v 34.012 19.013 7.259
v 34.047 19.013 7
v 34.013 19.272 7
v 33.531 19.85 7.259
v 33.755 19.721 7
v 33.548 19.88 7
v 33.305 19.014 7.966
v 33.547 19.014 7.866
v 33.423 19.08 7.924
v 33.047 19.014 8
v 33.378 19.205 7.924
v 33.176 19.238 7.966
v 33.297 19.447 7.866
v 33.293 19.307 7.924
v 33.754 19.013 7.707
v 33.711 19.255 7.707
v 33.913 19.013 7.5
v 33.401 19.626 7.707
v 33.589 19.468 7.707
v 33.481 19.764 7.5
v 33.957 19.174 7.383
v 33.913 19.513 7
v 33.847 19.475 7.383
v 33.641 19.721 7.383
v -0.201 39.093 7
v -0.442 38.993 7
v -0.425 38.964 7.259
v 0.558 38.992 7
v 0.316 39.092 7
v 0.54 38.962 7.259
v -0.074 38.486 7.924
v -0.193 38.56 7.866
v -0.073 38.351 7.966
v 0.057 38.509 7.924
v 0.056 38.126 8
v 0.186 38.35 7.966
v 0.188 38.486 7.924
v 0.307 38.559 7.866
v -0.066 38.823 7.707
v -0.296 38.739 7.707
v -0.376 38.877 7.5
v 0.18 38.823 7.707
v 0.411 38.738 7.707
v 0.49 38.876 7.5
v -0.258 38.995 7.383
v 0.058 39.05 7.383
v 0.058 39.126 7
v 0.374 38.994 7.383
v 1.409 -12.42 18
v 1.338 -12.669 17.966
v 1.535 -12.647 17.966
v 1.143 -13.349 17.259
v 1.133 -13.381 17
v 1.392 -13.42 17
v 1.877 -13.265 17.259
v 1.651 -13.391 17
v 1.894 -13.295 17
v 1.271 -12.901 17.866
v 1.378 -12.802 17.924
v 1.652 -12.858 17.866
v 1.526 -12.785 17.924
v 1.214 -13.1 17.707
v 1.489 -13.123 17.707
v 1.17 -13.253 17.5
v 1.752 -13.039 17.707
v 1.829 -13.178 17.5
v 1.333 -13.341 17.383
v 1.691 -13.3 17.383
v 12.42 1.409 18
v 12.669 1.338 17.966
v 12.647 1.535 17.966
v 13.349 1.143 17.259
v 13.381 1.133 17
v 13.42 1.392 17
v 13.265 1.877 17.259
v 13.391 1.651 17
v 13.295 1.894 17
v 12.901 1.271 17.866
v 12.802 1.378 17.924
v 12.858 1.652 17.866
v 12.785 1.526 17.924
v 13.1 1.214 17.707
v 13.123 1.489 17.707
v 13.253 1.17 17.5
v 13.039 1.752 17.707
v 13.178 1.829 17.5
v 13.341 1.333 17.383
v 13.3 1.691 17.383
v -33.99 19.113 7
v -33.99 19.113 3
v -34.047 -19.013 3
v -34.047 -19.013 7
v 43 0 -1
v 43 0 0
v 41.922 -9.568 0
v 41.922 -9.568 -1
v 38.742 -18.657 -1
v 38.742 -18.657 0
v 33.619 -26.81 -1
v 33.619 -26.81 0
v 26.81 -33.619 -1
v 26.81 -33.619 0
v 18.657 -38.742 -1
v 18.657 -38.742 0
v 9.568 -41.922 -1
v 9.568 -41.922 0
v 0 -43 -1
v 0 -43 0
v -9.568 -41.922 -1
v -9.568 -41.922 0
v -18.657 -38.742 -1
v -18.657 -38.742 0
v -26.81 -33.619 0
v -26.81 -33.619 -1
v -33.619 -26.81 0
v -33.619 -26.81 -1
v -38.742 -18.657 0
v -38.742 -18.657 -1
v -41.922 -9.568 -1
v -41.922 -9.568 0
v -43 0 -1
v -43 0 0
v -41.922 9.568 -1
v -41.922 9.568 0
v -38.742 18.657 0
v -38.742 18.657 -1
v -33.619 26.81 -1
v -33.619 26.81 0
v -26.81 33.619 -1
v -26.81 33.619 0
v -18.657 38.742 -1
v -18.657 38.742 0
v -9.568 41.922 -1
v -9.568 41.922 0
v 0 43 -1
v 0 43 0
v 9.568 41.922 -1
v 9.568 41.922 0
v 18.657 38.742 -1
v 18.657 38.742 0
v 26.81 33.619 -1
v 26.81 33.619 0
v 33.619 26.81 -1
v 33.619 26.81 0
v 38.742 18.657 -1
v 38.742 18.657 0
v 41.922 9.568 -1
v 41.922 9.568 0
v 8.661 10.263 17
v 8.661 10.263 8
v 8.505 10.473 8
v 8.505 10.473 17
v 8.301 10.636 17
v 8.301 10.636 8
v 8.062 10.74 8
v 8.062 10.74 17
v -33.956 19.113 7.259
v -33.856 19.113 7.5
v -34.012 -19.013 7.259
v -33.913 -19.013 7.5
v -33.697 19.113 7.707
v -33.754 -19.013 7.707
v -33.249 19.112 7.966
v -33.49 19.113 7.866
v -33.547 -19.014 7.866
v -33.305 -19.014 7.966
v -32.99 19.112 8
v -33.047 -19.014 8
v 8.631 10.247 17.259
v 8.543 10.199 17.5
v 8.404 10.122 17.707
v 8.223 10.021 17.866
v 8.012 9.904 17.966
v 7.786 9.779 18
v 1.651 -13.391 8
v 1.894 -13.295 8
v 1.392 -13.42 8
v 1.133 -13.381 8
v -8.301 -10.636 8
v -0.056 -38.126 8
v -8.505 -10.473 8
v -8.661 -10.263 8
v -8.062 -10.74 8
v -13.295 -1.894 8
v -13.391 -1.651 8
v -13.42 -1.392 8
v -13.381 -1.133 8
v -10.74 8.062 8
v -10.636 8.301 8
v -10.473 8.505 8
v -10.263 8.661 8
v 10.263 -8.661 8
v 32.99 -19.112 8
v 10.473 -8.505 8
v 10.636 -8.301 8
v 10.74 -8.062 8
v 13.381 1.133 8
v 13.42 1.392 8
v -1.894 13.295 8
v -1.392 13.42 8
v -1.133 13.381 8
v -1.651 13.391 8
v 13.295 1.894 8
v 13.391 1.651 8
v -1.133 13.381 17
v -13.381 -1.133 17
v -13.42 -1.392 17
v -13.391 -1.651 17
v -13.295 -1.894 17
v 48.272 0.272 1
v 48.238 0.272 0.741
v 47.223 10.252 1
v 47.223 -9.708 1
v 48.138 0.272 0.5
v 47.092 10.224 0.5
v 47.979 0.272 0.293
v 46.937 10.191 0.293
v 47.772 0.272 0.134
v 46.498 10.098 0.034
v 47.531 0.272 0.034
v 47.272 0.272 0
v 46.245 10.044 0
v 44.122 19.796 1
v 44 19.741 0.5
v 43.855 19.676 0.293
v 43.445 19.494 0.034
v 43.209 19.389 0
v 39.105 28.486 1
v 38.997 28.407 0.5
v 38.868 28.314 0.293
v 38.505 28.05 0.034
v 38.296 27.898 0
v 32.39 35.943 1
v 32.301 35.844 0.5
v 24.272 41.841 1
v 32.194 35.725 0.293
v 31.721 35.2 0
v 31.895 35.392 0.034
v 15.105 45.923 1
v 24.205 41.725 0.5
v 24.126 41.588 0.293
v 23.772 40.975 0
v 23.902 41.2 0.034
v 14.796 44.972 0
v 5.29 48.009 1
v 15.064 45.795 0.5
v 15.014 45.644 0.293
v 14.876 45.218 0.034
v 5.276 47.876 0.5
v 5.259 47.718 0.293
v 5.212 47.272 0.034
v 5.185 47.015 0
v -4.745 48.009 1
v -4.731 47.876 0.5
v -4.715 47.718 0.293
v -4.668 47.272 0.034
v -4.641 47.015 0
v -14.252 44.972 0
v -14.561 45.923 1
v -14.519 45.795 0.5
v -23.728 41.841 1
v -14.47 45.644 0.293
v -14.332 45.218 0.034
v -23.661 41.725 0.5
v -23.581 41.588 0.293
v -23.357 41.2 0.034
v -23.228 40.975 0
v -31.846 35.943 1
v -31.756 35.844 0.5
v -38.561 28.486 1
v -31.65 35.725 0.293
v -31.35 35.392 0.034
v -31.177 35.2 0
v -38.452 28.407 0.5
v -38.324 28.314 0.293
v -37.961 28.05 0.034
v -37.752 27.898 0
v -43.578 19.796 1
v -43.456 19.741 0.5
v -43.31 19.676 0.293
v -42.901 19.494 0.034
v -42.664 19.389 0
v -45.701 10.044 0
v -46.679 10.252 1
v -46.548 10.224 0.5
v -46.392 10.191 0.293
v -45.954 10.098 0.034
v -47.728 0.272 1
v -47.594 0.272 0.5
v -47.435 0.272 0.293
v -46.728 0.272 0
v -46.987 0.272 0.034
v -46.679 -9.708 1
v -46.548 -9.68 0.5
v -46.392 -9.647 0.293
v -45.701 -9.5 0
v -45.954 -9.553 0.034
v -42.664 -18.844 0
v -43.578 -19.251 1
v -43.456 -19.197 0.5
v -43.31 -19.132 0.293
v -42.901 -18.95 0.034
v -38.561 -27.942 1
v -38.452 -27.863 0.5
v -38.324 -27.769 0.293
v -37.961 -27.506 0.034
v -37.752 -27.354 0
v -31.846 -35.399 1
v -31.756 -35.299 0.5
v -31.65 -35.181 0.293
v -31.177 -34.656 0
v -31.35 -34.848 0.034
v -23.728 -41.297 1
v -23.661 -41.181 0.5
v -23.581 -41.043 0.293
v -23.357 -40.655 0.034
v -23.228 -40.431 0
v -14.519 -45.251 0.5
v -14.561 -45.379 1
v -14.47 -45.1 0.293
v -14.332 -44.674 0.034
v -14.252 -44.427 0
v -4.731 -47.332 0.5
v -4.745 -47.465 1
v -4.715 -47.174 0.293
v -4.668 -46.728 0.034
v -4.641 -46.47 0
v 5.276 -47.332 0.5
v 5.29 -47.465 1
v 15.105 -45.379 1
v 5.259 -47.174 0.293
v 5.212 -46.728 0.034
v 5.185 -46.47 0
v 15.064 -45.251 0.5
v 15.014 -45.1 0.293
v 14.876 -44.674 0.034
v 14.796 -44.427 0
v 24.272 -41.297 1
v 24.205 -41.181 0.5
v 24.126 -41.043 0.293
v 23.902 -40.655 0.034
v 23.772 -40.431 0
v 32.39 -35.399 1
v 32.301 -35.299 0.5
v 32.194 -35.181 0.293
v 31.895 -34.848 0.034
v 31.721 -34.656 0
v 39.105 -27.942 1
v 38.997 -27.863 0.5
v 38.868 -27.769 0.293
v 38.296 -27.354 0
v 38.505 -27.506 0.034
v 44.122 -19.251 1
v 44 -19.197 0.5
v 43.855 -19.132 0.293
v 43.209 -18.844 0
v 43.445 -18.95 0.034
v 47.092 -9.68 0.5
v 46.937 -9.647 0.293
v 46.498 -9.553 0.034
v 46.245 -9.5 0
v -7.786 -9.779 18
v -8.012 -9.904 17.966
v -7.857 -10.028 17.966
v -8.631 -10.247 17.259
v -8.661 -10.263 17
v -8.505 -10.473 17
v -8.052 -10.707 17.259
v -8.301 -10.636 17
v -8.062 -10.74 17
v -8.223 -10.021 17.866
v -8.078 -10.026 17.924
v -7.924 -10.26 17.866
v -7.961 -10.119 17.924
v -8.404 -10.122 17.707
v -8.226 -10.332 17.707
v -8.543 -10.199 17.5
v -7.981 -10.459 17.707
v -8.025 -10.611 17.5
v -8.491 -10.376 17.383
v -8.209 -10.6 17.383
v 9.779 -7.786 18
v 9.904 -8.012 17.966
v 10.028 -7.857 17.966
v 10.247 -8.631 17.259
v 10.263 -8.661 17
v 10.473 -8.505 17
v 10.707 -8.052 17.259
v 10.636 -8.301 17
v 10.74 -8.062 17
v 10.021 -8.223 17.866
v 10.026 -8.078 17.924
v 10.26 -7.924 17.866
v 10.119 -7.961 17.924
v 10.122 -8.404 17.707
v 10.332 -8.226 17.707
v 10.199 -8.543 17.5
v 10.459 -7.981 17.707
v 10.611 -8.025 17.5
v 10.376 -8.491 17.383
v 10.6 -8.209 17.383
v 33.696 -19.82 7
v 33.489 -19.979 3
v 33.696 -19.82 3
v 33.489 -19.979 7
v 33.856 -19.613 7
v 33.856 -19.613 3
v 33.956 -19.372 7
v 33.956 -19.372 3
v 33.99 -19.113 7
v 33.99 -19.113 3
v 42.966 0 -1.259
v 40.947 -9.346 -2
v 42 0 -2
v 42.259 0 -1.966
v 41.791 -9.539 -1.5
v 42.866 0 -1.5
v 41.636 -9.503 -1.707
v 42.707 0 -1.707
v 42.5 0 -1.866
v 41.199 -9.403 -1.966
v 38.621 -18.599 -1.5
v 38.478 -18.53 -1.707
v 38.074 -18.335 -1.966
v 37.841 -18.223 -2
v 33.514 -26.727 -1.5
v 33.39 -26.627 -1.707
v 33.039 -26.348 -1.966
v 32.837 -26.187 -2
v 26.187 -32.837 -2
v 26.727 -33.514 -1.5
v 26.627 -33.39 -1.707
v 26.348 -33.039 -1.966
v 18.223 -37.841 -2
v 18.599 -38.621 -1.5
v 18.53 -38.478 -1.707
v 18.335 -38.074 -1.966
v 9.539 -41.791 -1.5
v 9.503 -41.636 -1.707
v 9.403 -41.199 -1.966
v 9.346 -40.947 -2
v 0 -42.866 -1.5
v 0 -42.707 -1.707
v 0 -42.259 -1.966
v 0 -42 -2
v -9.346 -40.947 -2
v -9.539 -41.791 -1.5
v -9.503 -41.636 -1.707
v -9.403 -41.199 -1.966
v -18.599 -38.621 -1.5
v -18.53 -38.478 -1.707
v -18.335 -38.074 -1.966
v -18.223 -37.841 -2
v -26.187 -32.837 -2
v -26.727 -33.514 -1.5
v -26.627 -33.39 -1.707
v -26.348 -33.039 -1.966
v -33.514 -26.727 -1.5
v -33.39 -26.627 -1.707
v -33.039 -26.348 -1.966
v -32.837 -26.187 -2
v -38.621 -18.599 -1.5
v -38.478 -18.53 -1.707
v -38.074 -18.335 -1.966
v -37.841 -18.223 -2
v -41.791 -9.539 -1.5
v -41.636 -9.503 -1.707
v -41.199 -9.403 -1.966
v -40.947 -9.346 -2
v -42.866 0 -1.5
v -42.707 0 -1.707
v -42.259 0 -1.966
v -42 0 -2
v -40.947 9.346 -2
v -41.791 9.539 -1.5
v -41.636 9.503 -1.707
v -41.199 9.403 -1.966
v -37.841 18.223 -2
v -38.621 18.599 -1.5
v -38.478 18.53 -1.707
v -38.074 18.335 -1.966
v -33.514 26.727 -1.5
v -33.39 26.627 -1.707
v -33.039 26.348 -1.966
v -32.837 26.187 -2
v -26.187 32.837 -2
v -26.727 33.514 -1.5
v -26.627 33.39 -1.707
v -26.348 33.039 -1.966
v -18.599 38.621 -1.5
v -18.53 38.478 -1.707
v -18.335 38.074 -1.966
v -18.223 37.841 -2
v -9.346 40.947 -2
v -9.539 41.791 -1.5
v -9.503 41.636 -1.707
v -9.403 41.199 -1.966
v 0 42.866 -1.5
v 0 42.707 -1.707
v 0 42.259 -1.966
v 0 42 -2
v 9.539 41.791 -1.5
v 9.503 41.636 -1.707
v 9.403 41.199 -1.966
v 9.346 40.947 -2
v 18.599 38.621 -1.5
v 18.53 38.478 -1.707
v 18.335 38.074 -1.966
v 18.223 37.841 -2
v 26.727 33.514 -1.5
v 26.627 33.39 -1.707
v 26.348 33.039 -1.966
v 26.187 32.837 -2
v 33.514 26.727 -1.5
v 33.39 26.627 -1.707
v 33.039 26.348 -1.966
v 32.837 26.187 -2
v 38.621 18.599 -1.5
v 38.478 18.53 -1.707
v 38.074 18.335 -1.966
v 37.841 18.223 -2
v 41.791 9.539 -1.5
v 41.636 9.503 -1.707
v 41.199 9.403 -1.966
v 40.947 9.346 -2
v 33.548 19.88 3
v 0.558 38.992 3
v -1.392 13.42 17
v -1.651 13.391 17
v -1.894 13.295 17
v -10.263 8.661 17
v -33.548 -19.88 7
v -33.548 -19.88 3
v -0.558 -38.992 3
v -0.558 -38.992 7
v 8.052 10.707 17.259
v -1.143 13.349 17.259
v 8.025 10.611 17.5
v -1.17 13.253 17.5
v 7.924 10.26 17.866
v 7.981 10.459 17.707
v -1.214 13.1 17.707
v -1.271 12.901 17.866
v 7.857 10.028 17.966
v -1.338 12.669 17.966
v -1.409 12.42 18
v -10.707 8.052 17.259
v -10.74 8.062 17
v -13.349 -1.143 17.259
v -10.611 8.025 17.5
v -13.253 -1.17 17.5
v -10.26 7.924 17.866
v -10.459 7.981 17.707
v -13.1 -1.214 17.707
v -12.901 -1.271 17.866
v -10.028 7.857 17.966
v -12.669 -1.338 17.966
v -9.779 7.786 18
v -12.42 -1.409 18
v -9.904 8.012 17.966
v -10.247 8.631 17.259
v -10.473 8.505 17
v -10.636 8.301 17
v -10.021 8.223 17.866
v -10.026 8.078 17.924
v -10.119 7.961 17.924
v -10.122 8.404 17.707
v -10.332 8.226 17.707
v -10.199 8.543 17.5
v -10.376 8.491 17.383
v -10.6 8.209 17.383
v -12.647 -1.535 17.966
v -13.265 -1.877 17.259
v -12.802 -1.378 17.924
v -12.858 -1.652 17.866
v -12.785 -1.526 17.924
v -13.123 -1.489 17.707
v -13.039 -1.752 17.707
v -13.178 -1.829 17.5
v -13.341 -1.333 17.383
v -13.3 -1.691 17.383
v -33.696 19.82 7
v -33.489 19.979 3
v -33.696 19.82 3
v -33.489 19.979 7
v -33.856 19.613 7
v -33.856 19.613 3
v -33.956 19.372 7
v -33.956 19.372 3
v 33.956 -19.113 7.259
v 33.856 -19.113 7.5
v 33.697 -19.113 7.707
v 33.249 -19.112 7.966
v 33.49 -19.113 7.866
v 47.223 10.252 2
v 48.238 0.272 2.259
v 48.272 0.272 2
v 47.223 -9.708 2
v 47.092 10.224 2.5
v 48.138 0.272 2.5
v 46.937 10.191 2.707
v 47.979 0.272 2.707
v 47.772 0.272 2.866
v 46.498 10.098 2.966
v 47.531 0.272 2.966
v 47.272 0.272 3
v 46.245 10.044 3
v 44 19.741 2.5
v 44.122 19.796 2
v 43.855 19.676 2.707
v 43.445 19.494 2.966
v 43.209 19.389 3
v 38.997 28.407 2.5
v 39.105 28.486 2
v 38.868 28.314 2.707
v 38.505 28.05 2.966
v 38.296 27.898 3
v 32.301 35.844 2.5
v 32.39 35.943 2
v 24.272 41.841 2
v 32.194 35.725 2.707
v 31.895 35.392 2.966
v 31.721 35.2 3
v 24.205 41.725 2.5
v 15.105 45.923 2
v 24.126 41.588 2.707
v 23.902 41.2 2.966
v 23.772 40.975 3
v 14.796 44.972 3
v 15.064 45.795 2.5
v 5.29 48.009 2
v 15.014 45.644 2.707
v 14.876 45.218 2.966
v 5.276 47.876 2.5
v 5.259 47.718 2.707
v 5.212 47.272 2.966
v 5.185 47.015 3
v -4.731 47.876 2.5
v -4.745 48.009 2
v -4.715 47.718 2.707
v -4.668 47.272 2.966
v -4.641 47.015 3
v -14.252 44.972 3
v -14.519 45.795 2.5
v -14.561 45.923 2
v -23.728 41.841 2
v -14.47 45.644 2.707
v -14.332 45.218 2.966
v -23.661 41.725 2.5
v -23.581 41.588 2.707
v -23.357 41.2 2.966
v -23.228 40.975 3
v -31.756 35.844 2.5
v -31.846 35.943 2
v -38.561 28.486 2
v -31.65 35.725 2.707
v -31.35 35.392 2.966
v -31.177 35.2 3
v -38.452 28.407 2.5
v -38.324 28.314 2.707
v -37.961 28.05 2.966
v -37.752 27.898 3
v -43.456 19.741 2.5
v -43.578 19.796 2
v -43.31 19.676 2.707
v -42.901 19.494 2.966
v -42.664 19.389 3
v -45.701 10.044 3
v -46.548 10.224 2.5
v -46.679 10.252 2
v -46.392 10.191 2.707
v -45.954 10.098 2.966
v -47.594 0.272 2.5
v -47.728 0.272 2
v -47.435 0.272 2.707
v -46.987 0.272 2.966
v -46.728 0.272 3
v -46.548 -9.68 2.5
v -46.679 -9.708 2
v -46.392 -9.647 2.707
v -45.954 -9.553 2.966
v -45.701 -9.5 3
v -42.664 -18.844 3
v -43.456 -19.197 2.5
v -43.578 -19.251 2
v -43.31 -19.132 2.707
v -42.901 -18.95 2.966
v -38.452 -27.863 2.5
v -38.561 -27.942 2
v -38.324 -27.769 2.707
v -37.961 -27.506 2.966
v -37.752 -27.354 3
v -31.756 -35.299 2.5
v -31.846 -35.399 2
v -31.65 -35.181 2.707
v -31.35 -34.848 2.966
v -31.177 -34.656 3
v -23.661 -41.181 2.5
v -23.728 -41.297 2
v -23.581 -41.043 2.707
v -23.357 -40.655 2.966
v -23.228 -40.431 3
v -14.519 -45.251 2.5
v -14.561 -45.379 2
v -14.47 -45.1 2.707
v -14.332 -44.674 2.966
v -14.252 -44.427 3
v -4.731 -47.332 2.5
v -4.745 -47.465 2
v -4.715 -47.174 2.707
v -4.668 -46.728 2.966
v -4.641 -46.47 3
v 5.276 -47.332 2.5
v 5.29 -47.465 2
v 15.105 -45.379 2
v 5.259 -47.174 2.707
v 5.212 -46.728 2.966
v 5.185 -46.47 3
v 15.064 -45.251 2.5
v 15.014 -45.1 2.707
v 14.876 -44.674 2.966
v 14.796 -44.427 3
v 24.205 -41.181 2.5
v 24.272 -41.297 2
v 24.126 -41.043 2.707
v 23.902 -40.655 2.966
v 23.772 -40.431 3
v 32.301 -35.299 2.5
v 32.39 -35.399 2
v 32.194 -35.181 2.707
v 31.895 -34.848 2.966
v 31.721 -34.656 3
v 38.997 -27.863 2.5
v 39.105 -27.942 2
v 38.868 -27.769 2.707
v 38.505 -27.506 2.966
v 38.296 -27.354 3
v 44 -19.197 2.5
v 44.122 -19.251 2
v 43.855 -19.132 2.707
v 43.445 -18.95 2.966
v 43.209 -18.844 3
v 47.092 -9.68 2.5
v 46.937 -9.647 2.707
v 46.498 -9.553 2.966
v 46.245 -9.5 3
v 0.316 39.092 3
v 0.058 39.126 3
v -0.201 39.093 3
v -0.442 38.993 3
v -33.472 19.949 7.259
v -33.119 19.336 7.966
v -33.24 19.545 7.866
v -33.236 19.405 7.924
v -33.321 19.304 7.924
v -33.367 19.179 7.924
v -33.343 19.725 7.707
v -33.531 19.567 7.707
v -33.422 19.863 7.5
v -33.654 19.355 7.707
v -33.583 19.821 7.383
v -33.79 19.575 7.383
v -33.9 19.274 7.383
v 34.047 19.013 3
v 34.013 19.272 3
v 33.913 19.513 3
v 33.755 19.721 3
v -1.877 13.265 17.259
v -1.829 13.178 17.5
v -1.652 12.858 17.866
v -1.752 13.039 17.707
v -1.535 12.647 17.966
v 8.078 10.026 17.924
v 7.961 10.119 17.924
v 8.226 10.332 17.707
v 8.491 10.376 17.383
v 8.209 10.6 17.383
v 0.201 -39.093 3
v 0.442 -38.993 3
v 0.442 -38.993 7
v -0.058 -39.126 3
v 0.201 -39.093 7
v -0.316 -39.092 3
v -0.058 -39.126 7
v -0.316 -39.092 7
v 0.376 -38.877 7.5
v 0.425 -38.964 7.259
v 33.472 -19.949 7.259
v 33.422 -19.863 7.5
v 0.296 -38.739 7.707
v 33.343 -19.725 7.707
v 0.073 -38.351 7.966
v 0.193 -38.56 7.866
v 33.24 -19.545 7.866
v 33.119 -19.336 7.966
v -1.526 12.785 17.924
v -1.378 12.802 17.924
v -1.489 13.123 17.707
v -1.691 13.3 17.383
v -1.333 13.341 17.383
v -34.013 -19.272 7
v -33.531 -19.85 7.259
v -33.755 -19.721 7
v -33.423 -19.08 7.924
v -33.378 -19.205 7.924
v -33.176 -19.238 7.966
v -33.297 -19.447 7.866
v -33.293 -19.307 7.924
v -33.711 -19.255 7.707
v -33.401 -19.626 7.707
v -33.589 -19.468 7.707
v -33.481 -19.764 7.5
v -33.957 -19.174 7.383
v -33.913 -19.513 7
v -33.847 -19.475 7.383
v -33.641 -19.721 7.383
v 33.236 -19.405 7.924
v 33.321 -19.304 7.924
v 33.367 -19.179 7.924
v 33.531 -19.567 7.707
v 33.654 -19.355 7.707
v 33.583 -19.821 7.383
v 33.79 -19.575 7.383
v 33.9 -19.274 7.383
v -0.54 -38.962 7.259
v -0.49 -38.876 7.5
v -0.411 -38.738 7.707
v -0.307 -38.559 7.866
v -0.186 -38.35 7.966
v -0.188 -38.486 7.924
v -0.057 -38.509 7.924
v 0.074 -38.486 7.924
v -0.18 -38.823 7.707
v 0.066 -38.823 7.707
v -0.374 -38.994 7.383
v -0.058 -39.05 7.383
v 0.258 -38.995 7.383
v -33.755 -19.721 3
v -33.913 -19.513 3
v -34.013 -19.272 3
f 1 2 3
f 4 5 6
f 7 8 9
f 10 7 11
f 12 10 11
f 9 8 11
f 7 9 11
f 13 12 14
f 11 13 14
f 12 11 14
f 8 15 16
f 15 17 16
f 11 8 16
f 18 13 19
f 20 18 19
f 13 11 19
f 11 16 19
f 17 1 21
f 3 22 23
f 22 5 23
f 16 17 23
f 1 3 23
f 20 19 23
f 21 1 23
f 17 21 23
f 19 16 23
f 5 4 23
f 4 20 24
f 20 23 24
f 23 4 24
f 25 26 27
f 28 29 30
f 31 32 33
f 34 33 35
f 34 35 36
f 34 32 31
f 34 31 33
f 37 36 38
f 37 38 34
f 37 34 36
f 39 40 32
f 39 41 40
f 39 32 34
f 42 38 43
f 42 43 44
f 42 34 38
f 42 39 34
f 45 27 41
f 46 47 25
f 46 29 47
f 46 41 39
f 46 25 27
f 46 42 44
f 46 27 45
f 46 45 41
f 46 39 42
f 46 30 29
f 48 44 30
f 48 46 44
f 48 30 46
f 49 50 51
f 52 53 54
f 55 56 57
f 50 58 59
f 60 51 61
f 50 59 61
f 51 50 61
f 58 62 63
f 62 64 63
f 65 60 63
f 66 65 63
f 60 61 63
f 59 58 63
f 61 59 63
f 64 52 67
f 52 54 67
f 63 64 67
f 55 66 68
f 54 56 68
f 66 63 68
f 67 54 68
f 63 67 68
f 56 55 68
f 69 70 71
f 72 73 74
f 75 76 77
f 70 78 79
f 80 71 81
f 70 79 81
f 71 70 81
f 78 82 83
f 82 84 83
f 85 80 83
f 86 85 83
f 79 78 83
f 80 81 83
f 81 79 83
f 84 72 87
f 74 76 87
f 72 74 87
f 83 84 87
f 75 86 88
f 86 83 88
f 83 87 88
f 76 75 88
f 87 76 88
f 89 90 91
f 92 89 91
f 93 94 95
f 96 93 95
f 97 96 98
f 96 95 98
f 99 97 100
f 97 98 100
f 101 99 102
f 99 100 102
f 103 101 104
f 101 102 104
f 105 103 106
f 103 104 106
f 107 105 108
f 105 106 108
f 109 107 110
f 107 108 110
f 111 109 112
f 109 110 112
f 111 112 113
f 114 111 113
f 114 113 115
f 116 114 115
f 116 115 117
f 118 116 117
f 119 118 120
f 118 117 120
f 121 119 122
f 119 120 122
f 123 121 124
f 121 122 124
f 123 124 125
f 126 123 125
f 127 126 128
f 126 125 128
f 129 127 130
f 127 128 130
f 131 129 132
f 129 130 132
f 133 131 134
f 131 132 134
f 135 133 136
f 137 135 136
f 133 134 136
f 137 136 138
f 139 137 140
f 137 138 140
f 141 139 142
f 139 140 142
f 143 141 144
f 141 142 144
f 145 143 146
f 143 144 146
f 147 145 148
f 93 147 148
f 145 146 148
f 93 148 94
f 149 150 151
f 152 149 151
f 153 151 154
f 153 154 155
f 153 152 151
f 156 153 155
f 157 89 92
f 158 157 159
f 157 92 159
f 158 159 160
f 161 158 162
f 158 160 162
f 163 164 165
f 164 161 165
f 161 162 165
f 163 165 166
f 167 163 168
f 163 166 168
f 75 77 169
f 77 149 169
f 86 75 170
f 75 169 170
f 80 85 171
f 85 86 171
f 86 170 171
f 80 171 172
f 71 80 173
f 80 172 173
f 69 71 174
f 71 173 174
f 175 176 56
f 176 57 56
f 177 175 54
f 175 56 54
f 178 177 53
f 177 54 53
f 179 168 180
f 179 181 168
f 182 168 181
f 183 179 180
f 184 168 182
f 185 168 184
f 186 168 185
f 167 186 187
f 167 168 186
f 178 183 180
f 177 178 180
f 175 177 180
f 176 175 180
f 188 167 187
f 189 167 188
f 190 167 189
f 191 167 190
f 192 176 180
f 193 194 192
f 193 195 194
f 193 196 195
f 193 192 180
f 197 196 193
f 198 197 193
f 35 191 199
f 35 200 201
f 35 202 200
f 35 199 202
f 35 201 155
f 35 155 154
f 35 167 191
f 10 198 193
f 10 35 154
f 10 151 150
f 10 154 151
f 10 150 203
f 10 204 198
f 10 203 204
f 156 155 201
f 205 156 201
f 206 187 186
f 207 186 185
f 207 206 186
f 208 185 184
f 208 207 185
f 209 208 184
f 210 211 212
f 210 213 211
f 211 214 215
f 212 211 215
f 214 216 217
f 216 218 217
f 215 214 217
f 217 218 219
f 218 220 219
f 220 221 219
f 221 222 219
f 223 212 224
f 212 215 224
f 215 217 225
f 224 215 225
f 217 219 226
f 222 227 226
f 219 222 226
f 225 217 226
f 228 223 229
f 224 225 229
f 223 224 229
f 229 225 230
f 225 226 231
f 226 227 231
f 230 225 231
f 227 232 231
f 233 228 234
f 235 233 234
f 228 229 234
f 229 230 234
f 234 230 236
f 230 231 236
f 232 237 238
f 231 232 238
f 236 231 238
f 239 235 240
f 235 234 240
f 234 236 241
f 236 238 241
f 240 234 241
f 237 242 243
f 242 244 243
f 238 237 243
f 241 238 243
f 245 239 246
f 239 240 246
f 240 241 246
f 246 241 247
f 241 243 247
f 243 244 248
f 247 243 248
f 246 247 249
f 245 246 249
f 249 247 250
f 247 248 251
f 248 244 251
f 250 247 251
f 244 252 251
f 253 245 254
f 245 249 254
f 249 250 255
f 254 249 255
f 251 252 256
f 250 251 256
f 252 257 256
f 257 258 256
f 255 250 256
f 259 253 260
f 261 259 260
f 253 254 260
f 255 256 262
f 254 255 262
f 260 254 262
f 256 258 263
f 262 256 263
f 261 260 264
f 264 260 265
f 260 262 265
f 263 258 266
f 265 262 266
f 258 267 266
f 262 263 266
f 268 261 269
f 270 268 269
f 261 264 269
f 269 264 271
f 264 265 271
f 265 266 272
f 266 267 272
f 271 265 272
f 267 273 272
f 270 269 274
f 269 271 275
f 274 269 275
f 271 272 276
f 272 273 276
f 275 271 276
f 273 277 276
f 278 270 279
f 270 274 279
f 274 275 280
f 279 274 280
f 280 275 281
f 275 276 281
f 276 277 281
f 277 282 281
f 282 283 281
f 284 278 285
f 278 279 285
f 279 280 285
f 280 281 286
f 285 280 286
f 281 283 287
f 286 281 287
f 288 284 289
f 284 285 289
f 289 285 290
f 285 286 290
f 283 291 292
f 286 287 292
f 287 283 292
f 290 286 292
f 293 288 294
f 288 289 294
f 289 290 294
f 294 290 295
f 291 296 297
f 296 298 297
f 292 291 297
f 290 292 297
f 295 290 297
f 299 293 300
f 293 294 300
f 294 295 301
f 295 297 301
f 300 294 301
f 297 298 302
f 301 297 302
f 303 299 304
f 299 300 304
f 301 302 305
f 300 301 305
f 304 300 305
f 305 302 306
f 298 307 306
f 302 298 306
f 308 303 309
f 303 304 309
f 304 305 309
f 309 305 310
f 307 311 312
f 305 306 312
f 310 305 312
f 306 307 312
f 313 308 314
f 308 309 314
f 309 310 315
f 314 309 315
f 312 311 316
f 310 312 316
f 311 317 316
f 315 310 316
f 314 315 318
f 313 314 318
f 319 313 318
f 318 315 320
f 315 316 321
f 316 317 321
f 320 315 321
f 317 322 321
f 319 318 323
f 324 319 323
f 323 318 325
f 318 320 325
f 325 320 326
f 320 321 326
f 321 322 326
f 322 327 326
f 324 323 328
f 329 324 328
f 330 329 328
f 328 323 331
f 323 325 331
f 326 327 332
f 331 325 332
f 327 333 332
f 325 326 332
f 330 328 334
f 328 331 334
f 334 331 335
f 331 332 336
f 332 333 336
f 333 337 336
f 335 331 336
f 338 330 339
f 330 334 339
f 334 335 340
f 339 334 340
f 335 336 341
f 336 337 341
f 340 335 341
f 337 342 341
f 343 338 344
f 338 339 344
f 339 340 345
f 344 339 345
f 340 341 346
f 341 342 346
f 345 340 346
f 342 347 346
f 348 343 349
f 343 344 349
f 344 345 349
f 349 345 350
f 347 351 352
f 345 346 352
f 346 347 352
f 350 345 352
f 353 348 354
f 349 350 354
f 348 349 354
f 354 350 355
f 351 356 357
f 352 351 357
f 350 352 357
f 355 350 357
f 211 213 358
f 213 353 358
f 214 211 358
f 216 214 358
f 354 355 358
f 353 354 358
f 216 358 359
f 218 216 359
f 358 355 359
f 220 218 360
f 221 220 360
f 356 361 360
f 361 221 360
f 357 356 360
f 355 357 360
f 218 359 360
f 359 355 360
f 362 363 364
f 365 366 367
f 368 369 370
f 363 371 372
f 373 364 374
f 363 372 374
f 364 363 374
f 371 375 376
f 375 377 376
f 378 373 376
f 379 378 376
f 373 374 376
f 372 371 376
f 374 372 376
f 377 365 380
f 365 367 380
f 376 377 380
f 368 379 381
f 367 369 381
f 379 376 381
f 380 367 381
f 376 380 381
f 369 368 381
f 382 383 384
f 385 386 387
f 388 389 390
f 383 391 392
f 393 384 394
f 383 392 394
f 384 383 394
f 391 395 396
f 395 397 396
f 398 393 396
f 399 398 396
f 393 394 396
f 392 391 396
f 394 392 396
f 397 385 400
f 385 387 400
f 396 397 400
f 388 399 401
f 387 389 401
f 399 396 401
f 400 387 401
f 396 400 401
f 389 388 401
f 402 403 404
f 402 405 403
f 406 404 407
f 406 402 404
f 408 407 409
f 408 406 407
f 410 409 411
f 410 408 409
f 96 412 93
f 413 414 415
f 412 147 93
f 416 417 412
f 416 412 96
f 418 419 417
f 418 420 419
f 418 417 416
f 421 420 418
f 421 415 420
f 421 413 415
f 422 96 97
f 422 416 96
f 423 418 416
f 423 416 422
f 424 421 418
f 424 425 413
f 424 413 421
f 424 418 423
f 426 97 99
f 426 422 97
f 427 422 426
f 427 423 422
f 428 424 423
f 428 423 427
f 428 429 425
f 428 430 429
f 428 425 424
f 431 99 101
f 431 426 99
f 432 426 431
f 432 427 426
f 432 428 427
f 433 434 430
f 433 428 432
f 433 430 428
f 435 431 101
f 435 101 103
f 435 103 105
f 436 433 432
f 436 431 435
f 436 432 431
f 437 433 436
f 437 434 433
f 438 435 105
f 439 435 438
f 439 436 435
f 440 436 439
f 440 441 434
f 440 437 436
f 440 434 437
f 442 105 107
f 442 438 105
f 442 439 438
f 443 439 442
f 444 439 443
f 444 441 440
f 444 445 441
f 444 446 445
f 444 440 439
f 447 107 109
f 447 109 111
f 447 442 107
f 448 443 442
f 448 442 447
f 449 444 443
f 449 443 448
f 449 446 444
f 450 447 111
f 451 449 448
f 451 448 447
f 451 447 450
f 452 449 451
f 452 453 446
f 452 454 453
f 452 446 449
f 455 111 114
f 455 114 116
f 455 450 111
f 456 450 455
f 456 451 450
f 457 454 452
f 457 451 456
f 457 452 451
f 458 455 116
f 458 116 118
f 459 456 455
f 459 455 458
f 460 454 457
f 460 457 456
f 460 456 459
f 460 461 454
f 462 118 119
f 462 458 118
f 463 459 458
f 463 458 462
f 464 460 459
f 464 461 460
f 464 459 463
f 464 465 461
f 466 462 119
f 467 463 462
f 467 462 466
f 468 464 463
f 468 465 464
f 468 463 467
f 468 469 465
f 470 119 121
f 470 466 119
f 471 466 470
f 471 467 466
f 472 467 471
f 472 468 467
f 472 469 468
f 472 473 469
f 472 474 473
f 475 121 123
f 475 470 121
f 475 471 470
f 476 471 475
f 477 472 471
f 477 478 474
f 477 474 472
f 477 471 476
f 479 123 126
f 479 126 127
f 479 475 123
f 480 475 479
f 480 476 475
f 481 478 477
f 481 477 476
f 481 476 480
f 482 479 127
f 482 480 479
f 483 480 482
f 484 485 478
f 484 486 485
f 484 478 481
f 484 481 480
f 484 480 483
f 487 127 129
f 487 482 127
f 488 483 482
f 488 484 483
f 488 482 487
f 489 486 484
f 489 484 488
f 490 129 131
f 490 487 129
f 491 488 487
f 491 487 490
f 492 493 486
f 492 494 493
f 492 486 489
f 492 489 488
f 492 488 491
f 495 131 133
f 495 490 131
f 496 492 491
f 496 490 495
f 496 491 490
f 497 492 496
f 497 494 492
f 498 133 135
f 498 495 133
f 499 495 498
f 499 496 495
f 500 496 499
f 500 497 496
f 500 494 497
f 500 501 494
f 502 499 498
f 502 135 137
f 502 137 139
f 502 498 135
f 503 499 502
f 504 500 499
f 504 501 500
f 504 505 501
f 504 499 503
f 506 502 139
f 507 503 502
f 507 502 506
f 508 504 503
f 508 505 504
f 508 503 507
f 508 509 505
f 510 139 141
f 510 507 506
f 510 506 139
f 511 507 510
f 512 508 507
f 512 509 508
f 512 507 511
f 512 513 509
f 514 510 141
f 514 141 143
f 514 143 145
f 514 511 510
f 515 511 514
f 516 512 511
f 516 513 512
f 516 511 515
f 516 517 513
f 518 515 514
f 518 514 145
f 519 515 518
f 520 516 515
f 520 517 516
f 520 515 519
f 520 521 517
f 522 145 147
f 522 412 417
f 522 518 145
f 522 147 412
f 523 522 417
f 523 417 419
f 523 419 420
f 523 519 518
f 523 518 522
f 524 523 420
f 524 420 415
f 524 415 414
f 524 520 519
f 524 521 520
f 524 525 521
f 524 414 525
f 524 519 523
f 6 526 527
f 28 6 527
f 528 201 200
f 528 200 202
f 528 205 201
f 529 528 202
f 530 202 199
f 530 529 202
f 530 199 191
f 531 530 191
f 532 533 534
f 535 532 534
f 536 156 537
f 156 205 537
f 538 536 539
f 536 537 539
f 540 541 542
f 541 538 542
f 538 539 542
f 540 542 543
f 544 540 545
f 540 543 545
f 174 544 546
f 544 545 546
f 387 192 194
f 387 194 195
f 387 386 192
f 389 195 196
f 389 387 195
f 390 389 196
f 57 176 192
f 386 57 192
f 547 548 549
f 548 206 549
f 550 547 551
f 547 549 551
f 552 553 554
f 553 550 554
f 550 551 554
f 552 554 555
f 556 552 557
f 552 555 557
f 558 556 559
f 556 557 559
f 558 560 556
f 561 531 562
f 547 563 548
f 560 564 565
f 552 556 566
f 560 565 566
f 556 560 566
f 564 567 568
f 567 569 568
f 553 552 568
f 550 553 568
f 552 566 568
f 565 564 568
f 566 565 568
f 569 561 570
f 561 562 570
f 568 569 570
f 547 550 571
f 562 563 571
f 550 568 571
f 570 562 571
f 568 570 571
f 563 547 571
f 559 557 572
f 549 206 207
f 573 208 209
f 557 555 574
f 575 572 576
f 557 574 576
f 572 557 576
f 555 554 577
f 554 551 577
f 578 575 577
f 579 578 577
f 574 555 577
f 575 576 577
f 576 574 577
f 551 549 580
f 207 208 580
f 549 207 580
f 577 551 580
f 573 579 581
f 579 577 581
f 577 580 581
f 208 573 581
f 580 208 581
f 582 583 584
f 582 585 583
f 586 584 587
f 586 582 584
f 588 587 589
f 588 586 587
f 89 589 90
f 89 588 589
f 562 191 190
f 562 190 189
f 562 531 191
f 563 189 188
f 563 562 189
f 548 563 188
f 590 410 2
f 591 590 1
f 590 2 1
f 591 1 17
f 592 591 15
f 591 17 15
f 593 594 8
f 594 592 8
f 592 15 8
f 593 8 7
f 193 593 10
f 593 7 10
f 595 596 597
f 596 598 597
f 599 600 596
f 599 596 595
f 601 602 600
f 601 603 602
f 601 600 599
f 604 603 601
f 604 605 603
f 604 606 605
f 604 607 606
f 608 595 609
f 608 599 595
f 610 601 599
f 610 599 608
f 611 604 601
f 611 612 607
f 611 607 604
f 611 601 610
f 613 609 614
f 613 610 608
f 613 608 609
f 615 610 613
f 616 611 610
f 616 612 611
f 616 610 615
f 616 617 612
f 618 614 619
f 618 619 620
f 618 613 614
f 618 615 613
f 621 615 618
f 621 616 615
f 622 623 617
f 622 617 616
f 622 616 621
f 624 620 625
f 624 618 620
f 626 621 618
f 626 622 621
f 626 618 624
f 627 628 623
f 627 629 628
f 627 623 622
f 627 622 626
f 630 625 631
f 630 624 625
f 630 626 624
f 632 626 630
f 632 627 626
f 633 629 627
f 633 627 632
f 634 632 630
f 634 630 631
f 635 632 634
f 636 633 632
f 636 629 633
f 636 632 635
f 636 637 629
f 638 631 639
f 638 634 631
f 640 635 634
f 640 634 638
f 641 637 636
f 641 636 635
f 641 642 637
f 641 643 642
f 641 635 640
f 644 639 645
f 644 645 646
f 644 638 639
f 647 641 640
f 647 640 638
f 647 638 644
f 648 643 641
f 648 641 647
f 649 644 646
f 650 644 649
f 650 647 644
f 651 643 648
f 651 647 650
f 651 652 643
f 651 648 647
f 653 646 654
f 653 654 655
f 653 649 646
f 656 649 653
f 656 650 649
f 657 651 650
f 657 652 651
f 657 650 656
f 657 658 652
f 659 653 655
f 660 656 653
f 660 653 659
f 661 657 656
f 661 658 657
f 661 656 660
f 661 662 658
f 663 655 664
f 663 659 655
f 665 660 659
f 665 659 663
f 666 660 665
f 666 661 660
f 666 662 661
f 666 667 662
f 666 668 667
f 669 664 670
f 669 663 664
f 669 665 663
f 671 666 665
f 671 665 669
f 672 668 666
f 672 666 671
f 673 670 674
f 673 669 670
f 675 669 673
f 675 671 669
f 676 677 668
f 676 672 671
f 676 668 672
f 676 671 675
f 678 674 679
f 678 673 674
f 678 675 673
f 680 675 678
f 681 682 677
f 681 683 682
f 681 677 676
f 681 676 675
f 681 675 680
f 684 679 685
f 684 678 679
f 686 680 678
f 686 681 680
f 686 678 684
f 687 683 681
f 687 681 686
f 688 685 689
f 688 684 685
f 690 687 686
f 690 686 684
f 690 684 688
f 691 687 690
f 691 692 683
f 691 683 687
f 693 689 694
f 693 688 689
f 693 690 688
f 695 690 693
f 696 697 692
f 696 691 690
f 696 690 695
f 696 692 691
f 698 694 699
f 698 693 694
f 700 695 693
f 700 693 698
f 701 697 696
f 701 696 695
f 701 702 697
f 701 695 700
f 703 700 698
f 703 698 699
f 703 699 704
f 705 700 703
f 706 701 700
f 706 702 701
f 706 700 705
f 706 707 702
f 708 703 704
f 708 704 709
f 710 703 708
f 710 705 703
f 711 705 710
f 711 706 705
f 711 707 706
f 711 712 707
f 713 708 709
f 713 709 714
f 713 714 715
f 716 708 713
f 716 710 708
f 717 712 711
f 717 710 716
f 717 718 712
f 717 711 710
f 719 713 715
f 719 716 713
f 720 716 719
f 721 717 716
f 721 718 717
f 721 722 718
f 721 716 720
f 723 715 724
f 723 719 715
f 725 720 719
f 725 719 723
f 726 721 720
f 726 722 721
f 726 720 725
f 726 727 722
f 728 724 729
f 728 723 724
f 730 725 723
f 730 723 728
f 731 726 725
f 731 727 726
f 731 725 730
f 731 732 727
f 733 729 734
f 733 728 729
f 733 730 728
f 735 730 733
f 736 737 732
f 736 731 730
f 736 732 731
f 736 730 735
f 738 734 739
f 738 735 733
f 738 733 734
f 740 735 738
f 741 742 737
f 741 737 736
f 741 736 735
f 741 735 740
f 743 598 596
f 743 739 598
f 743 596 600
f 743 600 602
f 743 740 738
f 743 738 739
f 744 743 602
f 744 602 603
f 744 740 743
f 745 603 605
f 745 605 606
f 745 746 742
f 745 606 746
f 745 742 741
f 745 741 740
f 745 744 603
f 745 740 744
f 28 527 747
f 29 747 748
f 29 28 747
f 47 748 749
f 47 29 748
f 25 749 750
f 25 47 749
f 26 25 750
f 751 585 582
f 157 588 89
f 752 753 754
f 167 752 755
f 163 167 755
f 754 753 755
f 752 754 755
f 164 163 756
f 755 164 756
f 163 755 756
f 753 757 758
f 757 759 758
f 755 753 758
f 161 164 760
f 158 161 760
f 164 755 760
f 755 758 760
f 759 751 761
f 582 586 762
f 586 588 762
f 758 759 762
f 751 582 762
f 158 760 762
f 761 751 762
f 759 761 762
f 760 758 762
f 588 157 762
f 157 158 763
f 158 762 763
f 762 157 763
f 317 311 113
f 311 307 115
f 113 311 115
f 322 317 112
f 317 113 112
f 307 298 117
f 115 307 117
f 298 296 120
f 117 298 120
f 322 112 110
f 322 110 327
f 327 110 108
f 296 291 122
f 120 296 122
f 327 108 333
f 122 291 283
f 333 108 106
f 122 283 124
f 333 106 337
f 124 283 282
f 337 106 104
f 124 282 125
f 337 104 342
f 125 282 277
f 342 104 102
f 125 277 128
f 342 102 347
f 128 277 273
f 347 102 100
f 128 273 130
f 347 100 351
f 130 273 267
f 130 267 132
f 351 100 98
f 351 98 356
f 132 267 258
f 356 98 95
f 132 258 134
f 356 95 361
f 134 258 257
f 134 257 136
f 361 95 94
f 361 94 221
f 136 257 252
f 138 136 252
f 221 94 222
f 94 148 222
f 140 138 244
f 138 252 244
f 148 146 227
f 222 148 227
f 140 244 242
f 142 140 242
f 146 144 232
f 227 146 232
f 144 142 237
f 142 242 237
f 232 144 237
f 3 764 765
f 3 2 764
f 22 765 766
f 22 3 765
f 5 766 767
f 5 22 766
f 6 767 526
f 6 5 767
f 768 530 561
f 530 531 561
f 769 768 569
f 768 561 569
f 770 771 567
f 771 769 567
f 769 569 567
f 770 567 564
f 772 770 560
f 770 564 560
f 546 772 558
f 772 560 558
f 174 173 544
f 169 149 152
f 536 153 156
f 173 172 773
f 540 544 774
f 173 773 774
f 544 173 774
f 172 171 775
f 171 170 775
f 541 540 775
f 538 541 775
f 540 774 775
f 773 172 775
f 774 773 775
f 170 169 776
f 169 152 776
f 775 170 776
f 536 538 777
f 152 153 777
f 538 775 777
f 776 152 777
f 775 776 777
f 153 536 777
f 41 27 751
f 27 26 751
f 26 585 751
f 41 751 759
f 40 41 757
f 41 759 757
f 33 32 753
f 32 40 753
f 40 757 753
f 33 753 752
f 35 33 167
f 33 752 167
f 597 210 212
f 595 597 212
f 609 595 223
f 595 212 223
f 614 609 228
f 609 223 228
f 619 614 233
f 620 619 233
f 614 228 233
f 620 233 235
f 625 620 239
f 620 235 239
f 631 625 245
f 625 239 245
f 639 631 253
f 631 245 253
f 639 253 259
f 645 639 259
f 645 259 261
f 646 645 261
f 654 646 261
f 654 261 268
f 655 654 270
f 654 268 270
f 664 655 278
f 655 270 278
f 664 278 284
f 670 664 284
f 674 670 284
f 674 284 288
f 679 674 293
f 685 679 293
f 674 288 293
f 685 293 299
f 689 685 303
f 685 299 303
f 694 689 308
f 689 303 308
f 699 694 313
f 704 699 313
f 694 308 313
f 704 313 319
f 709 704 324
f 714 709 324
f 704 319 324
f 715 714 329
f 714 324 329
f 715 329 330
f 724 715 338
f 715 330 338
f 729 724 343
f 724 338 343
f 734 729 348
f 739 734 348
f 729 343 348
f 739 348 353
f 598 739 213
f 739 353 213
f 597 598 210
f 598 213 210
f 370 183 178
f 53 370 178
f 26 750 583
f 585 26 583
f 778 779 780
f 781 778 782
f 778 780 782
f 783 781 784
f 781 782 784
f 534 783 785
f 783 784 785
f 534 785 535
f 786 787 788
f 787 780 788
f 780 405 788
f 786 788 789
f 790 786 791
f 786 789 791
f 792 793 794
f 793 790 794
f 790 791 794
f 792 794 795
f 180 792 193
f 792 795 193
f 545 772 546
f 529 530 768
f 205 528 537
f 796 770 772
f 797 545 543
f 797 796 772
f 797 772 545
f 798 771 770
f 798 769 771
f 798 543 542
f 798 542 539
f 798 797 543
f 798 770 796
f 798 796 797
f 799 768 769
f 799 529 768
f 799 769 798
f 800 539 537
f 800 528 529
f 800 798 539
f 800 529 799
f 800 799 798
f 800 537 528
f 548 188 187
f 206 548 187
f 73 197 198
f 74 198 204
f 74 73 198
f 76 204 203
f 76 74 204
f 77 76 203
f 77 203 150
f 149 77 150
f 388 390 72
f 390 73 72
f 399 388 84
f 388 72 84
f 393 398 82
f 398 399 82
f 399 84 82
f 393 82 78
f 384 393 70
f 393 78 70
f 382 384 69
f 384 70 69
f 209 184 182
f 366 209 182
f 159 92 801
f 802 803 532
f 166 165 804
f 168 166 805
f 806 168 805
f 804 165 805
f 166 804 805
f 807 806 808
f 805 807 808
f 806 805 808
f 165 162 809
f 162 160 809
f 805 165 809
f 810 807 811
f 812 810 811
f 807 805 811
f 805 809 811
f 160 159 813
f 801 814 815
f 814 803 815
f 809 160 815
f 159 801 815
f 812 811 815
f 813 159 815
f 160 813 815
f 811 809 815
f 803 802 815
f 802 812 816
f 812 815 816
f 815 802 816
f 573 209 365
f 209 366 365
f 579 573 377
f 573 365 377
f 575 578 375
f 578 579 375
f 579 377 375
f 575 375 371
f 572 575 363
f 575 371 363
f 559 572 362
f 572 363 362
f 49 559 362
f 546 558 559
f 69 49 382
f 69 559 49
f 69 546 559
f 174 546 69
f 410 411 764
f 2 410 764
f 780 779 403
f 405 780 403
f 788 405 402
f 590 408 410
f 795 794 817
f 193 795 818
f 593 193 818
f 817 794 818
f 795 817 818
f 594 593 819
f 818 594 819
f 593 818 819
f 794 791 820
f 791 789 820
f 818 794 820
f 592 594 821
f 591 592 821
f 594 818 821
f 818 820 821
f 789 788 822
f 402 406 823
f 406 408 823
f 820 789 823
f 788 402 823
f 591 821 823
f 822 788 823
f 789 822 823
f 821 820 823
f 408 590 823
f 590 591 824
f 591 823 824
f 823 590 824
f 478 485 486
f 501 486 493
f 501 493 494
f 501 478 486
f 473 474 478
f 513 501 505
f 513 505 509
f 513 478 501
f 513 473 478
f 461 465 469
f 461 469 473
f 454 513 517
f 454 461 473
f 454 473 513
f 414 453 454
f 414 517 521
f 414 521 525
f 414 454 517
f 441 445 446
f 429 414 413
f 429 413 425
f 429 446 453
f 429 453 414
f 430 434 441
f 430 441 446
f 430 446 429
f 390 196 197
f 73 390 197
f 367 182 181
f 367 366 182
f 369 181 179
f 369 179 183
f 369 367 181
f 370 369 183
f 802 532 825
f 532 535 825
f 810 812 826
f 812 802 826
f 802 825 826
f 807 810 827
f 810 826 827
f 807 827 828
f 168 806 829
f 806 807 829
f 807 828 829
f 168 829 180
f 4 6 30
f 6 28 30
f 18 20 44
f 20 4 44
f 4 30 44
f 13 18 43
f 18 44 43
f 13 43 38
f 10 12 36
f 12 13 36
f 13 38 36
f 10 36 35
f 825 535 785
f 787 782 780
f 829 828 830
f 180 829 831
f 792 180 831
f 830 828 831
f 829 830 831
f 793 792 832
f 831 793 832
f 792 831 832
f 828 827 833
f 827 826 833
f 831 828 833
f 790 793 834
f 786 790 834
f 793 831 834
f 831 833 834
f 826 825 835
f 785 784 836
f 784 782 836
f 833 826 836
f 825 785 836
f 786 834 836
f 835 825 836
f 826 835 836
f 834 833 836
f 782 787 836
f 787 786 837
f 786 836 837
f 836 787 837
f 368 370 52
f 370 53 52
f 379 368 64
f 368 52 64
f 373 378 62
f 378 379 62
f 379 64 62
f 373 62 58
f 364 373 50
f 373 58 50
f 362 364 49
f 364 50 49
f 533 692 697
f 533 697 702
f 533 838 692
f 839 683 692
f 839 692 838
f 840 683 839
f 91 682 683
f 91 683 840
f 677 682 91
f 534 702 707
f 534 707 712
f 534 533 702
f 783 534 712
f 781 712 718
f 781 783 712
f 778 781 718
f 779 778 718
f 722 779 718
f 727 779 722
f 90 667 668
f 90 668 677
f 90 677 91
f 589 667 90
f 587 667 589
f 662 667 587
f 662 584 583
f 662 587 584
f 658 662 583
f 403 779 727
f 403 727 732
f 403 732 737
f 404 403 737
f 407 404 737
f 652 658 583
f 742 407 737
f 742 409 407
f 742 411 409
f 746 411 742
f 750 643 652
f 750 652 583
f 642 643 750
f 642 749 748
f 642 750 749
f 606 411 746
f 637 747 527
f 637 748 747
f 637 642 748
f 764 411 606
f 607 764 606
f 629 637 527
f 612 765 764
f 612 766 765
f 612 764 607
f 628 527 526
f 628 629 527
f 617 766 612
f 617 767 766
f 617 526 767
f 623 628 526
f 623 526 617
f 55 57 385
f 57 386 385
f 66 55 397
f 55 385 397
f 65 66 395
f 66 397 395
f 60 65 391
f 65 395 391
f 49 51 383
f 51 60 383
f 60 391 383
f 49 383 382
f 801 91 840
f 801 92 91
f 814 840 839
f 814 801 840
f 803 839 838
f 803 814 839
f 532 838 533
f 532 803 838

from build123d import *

# Parameters (mm, degrees)
F0_R     = 48
F1_DEPTH = 3
F3_DEPTH = 5
F5_DEPTH = 10
F6_R     = 43
F7_DEPTH = 2
F8_R     = 1


with BuildPart() as f1:
    # F0 (on Top) → F1 (new body)
    with BuildSketch(Plane.XY):
        with Locations((0.272178, 0.272177)):
            Circle(F0_R)
    extrude(amount=F1_DEPTH)

    # F2 (on face) → F3 (join)
    with BuildSketch(Plane.XY.offset(3)):
        Polygon((-0.057956, -39.281055), (33.989413, -19.690719), (34.047369, 19.590336), (0.057956, 39.281055), (-33.989413, 19.690719), (-34.047369, -19.590336), align=None)
    extrude(amount=F3_DEPTH)

    # F4 (on face) → F5 (join)
    with BuildSketch(Plane.XY.offset(8)):
        Polygon((1.531467, -13.495673), (10.625793, -8.459971), (13.495673, 1.531467), (8.459971, 10.625793), (-1.531467, 13.495673), (-10.625793, 8.459971), (-13.495673, -1.531467), (-8.459971, -10.625793), align=None)
    extrude(amount=F5_DEPTH)

    # F6 (on face) → F7 (join)
    with BuildSketch(Plane(origin=(0, 0, 0), x_dir=(1, 0, 0), z_dir=(0, 0, -1))):
        Circle(F6_R)
    extrude(amount=F7_DEPTH)

    # F8
    f8_edges = [f1.edges().sort_by_distance(p)[0] for p in [
        (-16.965728, 29.485887, 8),
        (-34.018391, 0.050192, 8),
        (-17.052663, -29.435695, 8),
        (16.965728, -29.485887, 8),
        (34.018391, -0.050192, 8),
        (17.052663, 29.435695, 8),
        (-6.07863, 10.977822, 18),
        (-12.060733, 3.464252, 18),
        (-10.977822, -6.07863, 18),
        (-3.464252, -12.060733, 18),
        (6.07863, -10.977822, 18),
        (12.060733, -3.464252, 18),
        (10.977822, 6.07863, 18),
        (3.464252, 12.060733, 18),
        (-8.459971, -10.625793, 13),
        (1.531467, -13.495673, 13),
        (10.625793, -8.459971, 13),
        (13.495673, 1.531467, 13),
        (8.459971, 10.625793, 13),
        (-1.531467, 13.495673, 13),
        (-10.625793, 8.459971, 13),
        (-13.495673, -1.531467, 13),
        (0.057956, 39.281055, 5.5),
        (34.047369, 19.590336, 5.5),
        (33.989413, -19.690719, 5.5),
        (-0.057956, -39.281055, 5.5),
        (-34.047369, -19.590336, 5.5),
        (-33.989413, 19.690719, 5.5),
        (-47.727822, 0.272177, 3),
        (-47.727822, 0.272177, 0),
        (-43, 0, -2),
    ]]
    fillet(f8_edges, radius=F8_R)


solid = f1.part
